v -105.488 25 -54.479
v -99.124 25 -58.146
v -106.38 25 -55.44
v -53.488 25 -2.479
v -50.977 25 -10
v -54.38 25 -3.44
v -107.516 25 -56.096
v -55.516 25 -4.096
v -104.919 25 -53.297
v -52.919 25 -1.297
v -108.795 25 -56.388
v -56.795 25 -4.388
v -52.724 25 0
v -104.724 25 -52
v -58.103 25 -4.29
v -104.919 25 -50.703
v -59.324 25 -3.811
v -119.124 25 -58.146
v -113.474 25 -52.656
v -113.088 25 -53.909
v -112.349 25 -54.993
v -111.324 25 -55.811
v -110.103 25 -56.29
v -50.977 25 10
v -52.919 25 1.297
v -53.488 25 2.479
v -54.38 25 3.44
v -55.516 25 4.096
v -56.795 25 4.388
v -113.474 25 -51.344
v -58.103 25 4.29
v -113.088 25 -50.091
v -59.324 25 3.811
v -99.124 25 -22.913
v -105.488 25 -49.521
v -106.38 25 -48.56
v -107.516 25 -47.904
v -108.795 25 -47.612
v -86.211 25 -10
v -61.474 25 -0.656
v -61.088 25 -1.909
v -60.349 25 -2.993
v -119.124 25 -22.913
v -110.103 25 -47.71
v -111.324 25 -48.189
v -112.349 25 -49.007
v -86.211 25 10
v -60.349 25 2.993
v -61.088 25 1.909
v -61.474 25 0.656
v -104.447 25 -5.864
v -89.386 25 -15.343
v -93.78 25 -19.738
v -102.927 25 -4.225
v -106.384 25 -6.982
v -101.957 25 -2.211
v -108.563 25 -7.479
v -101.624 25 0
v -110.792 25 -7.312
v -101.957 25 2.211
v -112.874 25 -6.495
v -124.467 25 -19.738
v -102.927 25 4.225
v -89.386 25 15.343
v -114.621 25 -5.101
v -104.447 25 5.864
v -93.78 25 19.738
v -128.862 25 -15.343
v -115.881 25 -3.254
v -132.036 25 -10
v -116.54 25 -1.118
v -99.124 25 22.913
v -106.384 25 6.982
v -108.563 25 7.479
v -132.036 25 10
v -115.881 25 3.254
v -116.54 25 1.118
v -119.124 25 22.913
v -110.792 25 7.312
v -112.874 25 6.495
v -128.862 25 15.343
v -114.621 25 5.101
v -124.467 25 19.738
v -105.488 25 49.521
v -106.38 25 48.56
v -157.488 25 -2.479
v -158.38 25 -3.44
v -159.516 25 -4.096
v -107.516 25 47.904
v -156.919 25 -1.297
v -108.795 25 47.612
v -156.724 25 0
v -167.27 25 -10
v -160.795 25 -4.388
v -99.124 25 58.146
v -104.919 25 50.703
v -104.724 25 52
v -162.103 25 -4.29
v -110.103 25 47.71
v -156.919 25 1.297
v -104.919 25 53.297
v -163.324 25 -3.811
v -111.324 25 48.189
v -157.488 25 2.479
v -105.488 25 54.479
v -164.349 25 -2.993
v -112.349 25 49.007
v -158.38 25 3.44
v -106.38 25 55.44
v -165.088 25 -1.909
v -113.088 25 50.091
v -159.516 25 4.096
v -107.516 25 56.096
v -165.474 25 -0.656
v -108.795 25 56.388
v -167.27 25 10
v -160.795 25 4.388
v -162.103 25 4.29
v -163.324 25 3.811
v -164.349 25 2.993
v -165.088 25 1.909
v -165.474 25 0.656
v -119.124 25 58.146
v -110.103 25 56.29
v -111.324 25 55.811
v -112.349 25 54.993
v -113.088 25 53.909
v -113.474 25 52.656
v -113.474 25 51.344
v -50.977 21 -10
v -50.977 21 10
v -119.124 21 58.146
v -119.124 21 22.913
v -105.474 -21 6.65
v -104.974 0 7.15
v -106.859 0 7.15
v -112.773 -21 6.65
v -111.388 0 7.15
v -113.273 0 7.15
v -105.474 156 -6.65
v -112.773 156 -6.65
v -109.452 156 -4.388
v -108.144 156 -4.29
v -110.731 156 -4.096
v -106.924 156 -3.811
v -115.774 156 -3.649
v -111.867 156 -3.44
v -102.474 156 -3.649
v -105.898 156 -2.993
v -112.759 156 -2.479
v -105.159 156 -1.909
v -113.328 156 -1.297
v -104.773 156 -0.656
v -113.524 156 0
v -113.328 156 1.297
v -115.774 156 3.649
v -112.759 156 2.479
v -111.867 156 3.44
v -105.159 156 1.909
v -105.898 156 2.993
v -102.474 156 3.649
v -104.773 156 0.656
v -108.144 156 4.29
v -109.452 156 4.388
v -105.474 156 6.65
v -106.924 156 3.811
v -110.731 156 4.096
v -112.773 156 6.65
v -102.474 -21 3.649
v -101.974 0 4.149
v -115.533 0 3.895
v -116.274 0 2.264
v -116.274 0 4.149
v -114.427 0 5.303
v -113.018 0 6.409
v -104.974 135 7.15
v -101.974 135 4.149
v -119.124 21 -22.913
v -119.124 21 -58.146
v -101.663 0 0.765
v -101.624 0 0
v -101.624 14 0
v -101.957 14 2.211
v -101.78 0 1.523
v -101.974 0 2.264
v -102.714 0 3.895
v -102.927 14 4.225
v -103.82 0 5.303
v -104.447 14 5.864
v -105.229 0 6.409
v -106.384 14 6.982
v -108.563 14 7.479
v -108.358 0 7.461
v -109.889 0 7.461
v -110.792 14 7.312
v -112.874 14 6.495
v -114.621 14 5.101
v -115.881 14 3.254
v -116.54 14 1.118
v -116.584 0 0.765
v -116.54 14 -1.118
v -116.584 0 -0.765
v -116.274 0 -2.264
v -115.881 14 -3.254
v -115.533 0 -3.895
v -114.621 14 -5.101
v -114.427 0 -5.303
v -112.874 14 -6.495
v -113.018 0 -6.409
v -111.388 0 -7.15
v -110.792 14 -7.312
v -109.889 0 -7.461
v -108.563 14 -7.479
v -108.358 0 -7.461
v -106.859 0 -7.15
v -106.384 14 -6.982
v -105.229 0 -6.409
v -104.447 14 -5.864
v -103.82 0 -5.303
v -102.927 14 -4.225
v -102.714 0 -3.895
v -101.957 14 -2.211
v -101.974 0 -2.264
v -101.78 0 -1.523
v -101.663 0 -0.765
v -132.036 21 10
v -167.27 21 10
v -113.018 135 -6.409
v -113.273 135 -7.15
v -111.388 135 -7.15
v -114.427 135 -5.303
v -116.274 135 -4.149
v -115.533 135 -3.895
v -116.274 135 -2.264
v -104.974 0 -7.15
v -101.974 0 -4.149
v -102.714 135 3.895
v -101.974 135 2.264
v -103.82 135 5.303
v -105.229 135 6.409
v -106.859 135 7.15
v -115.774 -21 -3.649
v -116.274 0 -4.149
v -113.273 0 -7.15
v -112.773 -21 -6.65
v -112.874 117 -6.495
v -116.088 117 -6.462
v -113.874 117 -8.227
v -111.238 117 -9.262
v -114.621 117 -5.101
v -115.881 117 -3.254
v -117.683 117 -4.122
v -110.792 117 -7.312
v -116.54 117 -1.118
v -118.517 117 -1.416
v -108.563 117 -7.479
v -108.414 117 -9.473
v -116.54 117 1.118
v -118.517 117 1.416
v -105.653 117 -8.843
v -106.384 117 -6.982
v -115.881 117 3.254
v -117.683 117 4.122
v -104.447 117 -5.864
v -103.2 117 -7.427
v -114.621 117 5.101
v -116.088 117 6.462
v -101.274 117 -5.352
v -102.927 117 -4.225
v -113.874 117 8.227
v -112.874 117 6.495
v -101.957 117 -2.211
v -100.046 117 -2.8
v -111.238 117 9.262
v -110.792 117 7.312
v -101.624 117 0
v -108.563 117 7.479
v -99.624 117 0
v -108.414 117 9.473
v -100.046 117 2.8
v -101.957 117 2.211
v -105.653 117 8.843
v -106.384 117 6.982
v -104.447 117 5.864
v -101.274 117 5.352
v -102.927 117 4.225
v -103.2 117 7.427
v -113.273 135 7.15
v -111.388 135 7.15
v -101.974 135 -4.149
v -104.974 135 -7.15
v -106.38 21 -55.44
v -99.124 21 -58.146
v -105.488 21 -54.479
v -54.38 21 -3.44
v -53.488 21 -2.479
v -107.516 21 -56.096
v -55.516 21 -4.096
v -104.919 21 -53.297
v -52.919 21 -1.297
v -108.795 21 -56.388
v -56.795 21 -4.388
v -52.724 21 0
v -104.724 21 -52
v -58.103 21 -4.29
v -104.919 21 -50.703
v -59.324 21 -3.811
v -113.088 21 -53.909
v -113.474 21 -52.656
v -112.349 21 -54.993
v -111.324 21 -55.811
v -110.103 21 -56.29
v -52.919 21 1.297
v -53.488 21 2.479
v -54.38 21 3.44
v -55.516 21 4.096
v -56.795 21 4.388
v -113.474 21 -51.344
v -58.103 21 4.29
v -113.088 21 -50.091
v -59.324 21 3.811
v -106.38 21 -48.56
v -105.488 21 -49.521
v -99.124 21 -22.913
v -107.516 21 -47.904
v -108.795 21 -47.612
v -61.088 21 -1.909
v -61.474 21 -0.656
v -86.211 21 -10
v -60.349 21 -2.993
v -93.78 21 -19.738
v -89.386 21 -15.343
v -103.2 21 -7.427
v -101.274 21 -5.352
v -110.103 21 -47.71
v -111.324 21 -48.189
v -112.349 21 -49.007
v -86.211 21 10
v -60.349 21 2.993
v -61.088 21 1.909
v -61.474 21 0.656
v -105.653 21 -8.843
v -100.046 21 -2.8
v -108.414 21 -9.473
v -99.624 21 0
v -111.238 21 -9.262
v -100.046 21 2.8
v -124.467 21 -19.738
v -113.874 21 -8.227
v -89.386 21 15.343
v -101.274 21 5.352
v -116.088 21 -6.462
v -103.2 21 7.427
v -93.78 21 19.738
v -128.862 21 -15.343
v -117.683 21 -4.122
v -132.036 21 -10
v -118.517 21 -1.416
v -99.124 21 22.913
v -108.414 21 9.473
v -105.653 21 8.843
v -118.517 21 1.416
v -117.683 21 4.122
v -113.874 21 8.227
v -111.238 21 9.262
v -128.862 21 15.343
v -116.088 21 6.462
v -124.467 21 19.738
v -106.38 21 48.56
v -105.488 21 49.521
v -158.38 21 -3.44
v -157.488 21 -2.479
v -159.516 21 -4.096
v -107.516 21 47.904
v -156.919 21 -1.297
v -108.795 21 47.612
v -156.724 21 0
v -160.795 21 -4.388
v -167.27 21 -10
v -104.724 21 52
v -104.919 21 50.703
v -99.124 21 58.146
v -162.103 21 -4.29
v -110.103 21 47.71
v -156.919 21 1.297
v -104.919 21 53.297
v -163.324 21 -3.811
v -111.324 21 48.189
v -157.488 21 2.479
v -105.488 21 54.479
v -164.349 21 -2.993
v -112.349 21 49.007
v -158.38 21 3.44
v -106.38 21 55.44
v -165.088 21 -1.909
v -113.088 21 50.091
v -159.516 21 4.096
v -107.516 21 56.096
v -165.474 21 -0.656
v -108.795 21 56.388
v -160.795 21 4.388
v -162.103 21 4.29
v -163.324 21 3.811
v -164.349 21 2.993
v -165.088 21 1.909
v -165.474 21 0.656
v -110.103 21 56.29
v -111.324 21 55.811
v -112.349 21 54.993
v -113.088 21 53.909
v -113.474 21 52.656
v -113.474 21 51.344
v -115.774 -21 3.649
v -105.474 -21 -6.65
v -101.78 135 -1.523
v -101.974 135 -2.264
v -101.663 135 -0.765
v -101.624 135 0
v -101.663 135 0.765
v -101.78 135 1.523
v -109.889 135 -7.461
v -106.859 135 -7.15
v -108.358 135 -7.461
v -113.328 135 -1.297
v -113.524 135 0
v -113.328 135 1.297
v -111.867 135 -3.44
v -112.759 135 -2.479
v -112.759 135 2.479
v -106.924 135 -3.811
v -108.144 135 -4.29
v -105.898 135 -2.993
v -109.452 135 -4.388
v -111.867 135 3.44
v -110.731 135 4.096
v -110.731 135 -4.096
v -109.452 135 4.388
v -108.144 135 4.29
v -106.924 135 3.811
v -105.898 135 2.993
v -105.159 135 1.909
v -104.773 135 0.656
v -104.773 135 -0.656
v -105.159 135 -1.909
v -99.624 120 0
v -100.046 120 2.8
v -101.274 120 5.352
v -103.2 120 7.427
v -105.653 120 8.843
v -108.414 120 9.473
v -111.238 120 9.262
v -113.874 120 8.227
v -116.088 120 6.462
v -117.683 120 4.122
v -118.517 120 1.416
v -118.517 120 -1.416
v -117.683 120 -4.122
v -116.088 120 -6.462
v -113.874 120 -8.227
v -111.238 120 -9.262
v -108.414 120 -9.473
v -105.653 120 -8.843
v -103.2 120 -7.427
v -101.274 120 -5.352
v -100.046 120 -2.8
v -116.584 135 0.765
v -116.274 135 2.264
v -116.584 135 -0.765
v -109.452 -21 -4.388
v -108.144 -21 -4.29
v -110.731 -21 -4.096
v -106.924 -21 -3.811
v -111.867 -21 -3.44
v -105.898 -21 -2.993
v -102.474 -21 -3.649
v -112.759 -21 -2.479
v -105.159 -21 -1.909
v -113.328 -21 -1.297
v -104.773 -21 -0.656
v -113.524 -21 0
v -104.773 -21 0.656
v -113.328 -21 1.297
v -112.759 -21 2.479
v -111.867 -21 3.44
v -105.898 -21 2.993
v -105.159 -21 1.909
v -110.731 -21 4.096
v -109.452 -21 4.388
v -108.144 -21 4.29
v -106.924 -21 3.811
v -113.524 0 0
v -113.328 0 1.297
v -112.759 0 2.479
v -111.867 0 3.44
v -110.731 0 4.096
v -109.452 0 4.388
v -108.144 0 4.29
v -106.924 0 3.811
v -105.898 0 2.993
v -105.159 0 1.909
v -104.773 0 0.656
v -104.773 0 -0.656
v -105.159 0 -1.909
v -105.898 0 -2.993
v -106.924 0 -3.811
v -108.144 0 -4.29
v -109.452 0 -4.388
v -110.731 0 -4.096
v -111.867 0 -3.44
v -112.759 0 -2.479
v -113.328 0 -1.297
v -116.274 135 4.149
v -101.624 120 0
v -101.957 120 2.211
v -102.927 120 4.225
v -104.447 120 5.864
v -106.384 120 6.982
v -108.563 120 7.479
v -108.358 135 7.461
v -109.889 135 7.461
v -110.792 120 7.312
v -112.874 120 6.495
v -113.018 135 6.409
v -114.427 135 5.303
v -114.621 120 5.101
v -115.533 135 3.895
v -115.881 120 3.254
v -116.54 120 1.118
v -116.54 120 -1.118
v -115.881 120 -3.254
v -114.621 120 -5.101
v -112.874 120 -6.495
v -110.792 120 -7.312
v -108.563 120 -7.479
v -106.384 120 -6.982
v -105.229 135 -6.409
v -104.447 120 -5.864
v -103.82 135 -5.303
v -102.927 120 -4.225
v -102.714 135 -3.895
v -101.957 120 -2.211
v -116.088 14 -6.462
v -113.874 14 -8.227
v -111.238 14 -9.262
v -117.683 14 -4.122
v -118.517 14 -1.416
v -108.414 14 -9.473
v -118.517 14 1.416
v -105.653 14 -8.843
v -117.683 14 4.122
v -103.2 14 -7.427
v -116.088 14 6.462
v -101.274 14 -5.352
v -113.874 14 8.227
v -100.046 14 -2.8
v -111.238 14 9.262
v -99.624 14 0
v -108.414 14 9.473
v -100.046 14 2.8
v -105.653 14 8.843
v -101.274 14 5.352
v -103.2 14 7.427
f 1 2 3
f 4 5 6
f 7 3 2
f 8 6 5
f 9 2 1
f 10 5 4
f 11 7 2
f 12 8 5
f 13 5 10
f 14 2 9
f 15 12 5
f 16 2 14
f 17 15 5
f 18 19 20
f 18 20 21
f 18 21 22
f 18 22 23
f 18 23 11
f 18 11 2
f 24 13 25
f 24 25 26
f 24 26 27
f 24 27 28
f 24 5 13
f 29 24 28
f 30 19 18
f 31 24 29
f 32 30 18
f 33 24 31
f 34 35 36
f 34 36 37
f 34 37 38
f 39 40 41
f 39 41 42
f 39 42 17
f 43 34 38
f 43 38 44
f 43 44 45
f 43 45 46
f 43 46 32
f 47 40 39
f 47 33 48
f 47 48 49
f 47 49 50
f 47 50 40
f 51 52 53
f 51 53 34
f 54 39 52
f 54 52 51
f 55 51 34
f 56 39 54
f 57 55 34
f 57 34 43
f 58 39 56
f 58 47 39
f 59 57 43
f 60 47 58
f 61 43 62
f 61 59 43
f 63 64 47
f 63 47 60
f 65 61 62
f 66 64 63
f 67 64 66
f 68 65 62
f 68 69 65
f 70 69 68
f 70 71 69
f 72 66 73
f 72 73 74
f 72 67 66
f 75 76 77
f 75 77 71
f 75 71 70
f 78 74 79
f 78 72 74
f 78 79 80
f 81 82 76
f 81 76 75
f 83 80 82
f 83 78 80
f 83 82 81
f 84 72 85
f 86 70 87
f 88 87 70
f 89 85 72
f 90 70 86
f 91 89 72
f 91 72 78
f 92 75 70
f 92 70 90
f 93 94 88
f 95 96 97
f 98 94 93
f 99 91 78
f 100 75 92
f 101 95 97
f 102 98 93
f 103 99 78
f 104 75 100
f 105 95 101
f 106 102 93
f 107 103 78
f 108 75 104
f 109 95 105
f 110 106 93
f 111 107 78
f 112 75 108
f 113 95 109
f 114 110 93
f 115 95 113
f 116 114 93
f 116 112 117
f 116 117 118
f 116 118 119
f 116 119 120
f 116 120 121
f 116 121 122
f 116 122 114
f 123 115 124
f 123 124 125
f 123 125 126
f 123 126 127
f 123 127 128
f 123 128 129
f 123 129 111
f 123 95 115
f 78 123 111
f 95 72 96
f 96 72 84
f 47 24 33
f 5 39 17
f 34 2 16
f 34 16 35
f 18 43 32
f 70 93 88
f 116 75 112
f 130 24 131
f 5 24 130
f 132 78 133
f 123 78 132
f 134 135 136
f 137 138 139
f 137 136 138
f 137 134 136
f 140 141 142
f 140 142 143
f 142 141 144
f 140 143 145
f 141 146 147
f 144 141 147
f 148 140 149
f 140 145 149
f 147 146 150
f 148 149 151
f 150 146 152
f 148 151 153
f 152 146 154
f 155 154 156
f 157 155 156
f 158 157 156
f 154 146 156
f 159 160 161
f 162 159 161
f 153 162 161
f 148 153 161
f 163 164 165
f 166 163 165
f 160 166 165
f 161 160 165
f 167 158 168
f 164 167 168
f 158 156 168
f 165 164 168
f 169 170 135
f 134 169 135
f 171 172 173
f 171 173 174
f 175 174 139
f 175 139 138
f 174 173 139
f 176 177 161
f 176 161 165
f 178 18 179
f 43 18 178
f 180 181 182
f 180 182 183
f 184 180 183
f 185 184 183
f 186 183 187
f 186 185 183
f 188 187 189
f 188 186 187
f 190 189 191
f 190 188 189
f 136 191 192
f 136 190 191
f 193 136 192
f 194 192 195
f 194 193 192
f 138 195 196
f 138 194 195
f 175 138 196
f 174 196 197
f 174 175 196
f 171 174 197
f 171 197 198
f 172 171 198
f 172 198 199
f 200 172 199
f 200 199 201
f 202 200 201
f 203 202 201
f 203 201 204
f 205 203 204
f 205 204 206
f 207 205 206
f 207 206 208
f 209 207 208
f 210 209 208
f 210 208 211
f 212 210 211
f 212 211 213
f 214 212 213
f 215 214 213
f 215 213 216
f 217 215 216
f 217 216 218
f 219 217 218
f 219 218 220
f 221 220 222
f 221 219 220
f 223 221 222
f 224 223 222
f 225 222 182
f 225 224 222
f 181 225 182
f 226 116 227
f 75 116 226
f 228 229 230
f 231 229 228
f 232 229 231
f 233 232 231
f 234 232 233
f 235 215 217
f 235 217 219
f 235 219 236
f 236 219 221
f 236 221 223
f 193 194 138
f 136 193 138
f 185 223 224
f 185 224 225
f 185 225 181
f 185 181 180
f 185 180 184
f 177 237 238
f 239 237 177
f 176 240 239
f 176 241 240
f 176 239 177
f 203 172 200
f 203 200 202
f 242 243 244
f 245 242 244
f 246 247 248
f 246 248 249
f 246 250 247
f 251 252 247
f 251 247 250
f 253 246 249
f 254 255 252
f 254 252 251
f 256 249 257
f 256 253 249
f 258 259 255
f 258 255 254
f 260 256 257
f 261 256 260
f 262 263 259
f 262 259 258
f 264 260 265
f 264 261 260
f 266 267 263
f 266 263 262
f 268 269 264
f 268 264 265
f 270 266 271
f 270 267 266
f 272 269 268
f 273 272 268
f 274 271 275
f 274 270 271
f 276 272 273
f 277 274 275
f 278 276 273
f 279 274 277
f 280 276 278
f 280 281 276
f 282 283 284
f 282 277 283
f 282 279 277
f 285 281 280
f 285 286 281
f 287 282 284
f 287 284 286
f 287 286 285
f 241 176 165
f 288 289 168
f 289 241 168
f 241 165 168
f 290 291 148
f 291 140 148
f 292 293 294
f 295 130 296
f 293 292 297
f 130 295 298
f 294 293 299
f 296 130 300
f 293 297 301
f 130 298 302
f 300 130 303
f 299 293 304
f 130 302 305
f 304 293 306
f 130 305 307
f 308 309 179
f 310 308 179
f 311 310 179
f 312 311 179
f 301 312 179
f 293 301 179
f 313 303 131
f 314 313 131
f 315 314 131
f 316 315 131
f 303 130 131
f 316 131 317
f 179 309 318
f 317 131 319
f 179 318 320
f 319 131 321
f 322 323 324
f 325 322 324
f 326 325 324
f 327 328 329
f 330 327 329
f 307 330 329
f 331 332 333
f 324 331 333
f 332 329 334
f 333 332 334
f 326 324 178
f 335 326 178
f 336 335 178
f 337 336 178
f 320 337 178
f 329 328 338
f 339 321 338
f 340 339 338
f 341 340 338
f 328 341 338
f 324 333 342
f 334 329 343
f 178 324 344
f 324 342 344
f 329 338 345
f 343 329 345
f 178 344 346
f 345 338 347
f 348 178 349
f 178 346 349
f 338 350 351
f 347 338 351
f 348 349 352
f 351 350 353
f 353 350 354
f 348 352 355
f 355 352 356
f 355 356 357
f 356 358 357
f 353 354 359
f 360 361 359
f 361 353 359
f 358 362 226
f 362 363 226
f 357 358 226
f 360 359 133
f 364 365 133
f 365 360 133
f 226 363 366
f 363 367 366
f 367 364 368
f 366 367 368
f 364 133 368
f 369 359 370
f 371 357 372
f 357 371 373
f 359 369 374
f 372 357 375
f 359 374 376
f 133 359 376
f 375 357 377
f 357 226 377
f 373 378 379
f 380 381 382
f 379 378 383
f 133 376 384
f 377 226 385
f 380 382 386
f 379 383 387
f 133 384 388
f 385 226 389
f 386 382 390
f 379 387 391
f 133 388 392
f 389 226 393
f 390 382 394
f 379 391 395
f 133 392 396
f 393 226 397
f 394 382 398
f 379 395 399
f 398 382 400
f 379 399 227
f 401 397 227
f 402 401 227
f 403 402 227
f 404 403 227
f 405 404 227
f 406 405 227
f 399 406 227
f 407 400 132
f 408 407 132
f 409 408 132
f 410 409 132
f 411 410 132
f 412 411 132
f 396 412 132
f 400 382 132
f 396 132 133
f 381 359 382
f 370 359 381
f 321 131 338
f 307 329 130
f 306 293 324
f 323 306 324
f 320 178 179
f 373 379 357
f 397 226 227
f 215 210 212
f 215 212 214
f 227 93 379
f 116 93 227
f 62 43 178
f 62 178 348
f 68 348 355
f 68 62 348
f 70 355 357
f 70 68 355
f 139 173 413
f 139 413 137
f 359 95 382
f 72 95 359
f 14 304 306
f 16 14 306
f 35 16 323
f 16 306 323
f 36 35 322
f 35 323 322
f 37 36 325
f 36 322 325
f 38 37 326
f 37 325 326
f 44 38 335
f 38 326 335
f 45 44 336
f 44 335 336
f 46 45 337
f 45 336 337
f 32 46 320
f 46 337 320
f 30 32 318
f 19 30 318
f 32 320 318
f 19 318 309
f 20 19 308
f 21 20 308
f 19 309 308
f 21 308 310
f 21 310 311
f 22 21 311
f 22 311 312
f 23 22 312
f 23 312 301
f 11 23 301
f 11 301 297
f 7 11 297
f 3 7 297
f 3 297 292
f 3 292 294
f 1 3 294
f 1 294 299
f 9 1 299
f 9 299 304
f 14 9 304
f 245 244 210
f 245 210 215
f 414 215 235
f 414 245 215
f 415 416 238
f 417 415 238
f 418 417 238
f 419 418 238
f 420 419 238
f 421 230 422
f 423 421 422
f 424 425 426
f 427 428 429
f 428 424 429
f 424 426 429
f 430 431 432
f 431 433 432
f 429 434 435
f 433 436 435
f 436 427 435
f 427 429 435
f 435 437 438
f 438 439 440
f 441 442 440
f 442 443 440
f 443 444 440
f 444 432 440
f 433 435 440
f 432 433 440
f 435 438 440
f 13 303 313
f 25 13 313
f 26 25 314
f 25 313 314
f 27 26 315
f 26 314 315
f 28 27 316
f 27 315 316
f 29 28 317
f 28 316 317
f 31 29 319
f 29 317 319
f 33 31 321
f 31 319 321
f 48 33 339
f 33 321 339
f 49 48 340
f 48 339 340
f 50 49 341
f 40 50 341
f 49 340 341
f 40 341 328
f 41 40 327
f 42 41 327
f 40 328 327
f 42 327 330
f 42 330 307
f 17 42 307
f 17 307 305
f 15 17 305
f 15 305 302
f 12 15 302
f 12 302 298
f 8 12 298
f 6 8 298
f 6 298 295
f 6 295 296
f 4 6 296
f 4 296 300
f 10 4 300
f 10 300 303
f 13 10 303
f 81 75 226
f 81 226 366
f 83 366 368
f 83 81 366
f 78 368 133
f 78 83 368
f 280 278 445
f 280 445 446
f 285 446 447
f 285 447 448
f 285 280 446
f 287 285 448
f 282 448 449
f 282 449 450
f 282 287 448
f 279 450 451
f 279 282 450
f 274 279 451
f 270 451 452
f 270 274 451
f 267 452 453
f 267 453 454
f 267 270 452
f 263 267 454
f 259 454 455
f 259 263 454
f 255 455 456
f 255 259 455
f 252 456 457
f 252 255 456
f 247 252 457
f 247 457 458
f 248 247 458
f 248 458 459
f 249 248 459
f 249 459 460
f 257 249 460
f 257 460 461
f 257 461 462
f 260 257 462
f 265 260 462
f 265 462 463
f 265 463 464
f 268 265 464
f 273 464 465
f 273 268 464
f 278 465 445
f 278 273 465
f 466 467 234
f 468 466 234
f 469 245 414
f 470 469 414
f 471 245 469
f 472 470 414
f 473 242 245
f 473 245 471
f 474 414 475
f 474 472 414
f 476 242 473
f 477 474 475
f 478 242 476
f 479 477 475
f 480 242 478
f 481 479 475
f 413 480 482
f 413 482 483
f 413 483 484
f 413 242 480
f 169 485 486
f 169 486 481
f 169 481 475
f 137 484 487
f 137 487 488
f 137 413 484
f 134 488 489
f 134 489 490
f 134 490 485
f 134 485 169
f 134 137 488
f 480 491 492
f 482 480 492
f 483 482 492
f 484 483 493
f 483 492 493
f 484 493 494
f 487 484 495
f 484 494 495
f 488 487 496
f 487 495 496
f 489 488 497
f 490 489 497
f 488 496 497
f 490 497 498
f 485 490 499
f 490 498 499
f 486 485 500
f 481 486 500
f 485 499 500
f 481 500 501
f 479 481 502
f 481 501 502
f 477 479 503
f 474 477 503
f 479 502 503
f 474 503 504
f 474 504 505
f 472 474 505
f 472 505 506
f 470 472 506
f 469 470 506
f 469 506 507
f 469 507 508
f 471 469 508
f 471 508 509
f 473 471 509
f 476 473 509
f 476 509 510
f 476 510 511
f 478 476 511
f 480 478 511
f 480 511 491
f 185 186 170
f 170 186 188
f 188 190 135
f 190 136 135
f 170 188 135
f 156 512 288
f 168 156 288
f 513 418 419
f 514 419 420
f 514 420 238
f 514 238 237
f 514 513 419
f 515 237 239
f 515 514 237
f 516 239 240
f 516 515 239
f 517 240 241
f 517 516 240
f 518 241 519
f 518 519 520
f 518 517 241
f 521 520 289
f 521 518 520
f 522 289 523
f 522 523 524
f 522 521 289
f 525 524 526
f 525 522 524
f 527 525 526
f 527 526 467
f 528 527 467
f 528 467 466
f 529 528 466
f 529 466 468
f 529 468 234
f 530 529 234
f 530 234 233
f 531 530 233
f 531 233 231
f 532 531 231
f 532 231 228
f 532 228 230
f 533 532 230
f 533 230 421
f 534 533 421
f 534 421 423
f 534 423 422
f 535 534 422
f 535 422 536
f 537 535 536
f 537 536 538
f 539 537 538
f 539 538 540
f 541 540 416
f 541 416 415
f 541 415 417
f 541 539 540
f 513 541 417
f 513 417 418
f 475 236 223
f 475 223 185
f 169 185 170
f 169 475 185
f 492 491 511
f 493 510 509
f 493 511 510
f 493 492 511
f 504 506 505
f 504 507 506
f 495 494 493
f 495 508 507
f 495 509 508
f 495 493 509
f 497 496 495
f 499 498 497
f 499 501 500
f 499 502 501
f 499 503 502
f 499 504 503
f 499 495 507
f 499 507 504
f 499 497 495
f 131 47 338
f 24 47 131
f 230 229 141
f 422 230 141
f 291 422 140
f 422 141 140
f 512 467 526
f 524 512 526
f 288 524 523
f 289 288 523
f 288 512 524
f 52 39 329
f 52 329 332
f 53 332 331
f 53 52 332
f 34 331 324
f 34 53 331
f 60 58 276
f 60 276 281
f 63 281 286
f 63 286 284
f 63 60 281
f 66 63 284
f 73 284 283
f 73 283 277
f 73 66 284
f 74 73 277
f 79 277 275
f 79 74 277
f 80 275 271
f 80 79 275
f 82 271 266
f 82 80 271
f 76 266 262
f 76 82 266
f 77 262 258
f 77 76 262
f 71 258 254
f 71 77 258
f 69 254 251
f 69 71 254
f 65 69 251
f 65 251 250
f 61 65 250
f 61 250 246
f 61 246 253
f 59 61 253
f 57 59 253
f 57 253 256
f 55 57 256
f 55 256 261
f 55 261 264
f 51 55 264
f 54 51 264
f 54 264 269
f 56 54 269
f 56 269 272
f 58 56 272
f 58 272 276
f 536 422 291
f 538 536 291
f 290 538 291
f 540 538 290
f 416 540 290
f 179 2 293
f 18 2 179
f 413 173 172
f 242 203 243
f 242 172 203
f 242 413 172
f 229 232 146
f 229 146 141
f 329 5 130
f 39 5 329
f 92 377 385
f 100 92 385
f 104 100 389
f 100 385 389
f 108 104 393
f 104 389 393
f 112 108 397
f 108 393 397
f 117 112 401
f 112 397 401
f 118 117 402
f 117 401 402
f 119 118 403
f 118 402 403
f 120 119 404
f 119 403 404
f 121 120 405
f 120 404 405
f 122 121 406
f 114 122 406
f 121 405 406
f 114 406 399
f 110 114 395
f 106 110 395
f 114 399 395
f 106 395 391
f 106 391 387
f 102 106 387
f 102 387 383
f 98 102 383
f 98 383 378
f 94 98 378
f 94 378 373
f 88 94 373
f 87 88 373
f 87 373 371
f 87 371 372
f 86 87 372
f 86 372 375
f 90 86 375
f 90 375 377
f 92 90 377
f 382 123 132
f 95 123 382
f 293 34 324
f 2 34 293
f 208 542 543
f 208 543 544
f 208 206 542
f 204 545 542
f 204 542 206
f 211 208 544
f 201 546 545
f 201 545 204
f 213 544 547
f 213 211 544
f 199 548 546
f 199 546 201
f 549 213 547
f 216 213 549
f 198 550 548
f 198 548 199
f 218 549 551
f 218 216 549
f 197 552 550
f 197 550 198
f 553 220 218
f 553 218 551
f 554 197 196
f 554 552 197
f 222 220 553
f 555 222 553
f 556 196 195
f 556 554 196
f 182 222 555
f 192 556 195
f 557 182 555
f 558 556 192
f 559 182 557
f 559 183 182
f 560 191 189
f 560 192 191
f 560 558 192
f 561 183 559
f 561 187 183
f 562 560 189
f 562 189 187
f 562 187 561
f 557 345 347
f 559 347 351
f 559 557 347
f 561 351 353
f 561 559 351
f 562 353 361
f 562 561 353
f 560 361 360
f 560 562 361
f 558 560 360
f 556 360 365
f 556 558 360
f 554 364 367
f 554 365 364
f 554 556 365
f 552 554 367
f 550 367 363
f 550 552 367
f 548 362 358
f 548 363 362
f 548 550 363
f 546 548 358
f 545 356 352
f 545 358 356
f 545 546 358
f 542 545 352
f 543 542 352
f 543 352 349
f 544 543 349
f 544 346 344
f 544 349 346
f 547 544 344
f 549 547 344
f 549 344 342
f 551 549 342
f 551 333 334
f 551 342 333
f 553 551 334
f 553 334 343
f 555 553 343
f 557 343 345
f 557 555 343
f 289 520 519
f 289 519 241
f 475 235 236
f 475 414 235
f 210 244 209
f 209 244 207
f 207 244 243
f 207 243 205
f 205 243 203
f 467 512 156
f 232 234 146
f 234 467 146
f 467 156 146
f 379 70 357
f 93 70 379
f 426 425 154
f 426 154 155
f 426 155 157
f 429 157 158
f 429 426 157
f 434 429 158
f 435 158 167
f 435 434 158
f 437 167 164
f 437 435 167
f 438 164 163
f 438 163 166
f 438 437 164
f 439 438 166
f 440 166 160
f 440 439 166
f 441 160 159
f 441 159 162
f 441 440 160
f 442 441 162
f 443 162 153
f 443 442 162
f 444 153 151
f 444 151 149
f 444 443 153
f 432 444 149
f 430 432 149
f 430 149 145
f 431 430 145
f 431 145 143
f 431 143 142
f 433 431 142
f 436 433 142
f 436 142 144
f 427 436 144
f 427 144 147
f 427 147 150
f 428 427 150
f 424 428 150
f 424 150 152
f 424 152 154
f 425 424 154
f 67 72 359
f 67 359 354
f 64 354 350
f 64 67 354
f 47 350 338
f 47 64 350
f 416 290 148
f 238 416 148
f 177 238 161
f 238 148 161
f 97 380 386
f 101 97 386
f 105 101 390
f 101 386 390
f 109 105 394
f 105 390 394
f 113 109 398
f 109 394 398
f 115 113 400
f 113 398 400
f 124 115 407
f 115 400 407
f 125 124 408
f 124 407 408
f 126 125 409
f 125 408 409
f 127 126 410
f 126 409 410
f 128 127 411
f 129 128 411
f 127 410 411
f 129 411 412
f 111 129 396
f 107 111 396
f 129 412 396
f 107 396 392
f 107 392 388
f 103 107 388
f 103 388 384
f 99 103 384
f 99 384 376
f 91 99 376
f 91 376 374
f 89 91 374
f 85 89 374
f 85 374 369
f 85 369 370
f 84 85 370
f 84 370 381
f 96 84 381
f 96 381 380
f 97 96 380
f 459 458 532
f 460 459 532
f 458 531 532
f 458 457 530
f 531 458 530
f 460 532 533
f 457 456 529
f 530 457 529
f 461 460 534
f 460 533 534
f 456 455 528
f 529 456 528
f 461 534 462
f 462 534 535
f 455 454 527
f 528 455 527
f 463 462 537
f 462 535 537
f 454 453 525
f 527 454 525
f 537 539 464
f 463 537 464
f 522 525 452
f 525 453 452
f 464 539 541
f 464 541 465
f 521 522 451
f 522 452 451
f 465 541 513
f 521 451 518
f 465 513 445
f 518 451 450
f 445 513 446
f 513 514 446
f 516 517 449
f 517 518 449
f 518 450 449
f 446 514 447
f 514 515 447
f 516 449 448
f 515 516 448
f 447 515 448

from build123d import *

# Parameters (mm, degrees)
F3_W      = 14.3
F3_H      = 14.3
F4_W      = 13.3
F4_H      = 13.3
F8_SIZE   = 3
F9_R      = 7.5
F10_DEPTH = 135
F11_START = -14
F9_R_2    = 9.5
F11_DEPTH = 11
F12_START = -117
F12_DEPTH = 3
F13_R     = 9.5
F14_DEPTH = 4
F15_D     = 8.8
F16_D     = 8.8


with BuildPart() as f7:
    # F3 (on Front) → F7 section 0
    with BuildSketch(Plane.XZ):
        with Locations((-109.1235904219, 0)):
            Rectangle(F3_W, F3_H)
    # F4 (on offset) → F7 section 1
    with BuildSketch(Plane.XZ.offset(21)):
        with Locations((-109.1235904219, 0)):
            Rectangle(F4_W, F4_H)
    loft()

    # F8
    f8_edges = [f7.edges().sort_by_distance(p)[0] for p in [
        (-116.02359, -10.5, 6.9),
        (-116.02359, -10.5, -6.9),
        (-102.22359, -10.5, 6.9),
        (-102.22359, -10.5, -6.9),
    ]]
    chamfer(f8_edges, length=F8_SIZE)

    # F16 (through all)
    with Locations(Plane.XZ.offset(21)):
        with Locations((-109.1235904219, 0)):
            Hole(F16_D / 2)



with BuildPart() as f10:
    # F9 (on Front) → F10 (new body, through all)
    with BuildSketch(Plane.XZ):
        with Locations((-109.1235904219, 0)):
            Circle(F9_R)
    extrude(amount=-F10_DEPTH)

    # F9 (on Front) → F11 (join)
    with BuildSketch(Plane.XZ.offset(F11_START)):
        with Locations((-109.1235904219, 0)):
            Circle(F9_R_2)
        with Locations((-109.1235904219, 0)):
            Circle(F9_R, mode=Mode.SUBTRACT)
    extrude(amount=-F11_DEPTH)

    # F9 (on Front) → F12 (join)
    with BuildSketch(Plane.XZ.offset(F12_START)):
        with Locations((-109.1235904219, 0)):
            Circle(F9_R_2)
        with Locations((-109.1235904219, 0)):
            Circle(F9_R, mode=Mode.SUBTRACT)
    extrude(amount=-F12_DEPTH)

    # F13 (on face) → F14 (join)
    with BuildSketch(Plane(origin=(0, 25, 0), x_dir=(-1, 0, 0), z_dir=(0, 1, 0))):
        with BuildLine():
            Line((119.1235904219, 22.9128784748), (119.1235904219, 58.1463670404))
            Line((119.1235904219, 58.1463670404), (99.1235904219, 58.1463670404))
            Line((99.1235904219, 58.1463670404), (99.1235904219, 22.9128784748))
            ThreePointArc((99.1235904219, 22.9128784748), (109.1235904219, 25), (119.1235904219, 22.9128784748))
        make_face()
        with BuildLine():
            Line((99.1235904219, -58.1463670404), (119.1235904219, -58.1463670404))
            Line((119.1235904219, -58.1463670404), (119.1235904219, -22.9128784748))
            ThreePointArc((119.1235904219, -22.9128784748), (109.1235904219, -25), (99.1235904219, -22.9128784748))
            Line((99.1235904219, -22.9128784748), (99.1235904219, -58.1463670404))
        make_face()
        with BuildLine():
            Line((167.2699574623, -10), (167.2699574623, 10))
            Line((167.2699574623, 10), (132.0364688967, 10))
            ThreePointArc((132.0364688967, 10), (133.5962482452, 5.1077410922), (134.1235904219, 0))
            ThreePointArc((134.1235904219, 0), (133.5962482452, -5.1077410922), (132.0364688967, -10))
            Line((132.0364688967, -10), (167.2699574623, -10))
        make_face()
        with BuildLine():
            ThreePointArc((134.1235904219, 0), (133.5962482452, 5.1077410922), (132.0364688967, 10))
            ThreePointArc((132.0364688967, 10), (126.8012599516, 17.6776695297), (119.1235904219, 22.9128784748))
            Line((119.1235904219, 22.9128784748), (99.1235904219, 22.9128784748))
            ThreePointArc((99.1235904219, 22.9128784748), (91.4459208923, 17.6776695297), (86.2107119471, 10))
            ThreePointArc((86.2107119471, 10), (84.1235904219, 0), (86.2107119471, -10))
            ThreePointArc((86.2107119471, -10), (91.4459208923, -17.6776695297), (99.1235904219, -22.9128784748))
            ThreePointArc((99.1235904219, -22.9128784748), (109.1235904219, -25), (119.1235904219, -22.9128784748))
            ThreePointArc((119.1235904219, -22.9128784748), (126.8012599516, -17.6776695297), (132.0364688967, -10))
            ThreePointArc((132.0364688967, -10), (133.5962482452, -5.1077410922), (134.1235904219, 0))
        make_face()
        with Locations((109.1235904219, 0)):
            Circle(F13_R, mode=Mode.SUBTRACT)
        with BuildLine():
            Line((86.2107119471, 10), (50.9772233815, 10))
            Line((50.9772233815, 10), (50.9772233815, -10))
            Line((50.9772233815, -10), (86.2107119471, -10))
            ThreePointArc((86.2107119471, -10), (84.1235904219, 0), (86.2107119471, 10))
        make_face()
        with BuildLine():
            Line((99.1235904219, 22.9128784748), (119.1235904219, 22.9128784748))
            ThreePointArc((119.1235904219, 22.9128784748), (109.1235904219, 25), (99.1235904219, 22.9128784748))
        make_face()
    extrude(amount=-F14_DEPTH)

    # F15 (through all)
    with Locations(Plane(origin=(0, 25, 0), x_dir=(-1, 0, 0), z_dir=(0, 1, 0))):
        with Locations((109.1235904219, 52), (57.1235904219, 0), (161.1235904219, 0), (109.1235904219, -52)):
            Hole(F15_D / 2)


with BuildPart() as f7_1:
    add(f7.part)

    add(f10.part)  # F17 merges F10
    # F17: F7 across plane
    add(f7.part.mirror(Plane.XZ.offset(-67.5)))


solid = f7_1.part
